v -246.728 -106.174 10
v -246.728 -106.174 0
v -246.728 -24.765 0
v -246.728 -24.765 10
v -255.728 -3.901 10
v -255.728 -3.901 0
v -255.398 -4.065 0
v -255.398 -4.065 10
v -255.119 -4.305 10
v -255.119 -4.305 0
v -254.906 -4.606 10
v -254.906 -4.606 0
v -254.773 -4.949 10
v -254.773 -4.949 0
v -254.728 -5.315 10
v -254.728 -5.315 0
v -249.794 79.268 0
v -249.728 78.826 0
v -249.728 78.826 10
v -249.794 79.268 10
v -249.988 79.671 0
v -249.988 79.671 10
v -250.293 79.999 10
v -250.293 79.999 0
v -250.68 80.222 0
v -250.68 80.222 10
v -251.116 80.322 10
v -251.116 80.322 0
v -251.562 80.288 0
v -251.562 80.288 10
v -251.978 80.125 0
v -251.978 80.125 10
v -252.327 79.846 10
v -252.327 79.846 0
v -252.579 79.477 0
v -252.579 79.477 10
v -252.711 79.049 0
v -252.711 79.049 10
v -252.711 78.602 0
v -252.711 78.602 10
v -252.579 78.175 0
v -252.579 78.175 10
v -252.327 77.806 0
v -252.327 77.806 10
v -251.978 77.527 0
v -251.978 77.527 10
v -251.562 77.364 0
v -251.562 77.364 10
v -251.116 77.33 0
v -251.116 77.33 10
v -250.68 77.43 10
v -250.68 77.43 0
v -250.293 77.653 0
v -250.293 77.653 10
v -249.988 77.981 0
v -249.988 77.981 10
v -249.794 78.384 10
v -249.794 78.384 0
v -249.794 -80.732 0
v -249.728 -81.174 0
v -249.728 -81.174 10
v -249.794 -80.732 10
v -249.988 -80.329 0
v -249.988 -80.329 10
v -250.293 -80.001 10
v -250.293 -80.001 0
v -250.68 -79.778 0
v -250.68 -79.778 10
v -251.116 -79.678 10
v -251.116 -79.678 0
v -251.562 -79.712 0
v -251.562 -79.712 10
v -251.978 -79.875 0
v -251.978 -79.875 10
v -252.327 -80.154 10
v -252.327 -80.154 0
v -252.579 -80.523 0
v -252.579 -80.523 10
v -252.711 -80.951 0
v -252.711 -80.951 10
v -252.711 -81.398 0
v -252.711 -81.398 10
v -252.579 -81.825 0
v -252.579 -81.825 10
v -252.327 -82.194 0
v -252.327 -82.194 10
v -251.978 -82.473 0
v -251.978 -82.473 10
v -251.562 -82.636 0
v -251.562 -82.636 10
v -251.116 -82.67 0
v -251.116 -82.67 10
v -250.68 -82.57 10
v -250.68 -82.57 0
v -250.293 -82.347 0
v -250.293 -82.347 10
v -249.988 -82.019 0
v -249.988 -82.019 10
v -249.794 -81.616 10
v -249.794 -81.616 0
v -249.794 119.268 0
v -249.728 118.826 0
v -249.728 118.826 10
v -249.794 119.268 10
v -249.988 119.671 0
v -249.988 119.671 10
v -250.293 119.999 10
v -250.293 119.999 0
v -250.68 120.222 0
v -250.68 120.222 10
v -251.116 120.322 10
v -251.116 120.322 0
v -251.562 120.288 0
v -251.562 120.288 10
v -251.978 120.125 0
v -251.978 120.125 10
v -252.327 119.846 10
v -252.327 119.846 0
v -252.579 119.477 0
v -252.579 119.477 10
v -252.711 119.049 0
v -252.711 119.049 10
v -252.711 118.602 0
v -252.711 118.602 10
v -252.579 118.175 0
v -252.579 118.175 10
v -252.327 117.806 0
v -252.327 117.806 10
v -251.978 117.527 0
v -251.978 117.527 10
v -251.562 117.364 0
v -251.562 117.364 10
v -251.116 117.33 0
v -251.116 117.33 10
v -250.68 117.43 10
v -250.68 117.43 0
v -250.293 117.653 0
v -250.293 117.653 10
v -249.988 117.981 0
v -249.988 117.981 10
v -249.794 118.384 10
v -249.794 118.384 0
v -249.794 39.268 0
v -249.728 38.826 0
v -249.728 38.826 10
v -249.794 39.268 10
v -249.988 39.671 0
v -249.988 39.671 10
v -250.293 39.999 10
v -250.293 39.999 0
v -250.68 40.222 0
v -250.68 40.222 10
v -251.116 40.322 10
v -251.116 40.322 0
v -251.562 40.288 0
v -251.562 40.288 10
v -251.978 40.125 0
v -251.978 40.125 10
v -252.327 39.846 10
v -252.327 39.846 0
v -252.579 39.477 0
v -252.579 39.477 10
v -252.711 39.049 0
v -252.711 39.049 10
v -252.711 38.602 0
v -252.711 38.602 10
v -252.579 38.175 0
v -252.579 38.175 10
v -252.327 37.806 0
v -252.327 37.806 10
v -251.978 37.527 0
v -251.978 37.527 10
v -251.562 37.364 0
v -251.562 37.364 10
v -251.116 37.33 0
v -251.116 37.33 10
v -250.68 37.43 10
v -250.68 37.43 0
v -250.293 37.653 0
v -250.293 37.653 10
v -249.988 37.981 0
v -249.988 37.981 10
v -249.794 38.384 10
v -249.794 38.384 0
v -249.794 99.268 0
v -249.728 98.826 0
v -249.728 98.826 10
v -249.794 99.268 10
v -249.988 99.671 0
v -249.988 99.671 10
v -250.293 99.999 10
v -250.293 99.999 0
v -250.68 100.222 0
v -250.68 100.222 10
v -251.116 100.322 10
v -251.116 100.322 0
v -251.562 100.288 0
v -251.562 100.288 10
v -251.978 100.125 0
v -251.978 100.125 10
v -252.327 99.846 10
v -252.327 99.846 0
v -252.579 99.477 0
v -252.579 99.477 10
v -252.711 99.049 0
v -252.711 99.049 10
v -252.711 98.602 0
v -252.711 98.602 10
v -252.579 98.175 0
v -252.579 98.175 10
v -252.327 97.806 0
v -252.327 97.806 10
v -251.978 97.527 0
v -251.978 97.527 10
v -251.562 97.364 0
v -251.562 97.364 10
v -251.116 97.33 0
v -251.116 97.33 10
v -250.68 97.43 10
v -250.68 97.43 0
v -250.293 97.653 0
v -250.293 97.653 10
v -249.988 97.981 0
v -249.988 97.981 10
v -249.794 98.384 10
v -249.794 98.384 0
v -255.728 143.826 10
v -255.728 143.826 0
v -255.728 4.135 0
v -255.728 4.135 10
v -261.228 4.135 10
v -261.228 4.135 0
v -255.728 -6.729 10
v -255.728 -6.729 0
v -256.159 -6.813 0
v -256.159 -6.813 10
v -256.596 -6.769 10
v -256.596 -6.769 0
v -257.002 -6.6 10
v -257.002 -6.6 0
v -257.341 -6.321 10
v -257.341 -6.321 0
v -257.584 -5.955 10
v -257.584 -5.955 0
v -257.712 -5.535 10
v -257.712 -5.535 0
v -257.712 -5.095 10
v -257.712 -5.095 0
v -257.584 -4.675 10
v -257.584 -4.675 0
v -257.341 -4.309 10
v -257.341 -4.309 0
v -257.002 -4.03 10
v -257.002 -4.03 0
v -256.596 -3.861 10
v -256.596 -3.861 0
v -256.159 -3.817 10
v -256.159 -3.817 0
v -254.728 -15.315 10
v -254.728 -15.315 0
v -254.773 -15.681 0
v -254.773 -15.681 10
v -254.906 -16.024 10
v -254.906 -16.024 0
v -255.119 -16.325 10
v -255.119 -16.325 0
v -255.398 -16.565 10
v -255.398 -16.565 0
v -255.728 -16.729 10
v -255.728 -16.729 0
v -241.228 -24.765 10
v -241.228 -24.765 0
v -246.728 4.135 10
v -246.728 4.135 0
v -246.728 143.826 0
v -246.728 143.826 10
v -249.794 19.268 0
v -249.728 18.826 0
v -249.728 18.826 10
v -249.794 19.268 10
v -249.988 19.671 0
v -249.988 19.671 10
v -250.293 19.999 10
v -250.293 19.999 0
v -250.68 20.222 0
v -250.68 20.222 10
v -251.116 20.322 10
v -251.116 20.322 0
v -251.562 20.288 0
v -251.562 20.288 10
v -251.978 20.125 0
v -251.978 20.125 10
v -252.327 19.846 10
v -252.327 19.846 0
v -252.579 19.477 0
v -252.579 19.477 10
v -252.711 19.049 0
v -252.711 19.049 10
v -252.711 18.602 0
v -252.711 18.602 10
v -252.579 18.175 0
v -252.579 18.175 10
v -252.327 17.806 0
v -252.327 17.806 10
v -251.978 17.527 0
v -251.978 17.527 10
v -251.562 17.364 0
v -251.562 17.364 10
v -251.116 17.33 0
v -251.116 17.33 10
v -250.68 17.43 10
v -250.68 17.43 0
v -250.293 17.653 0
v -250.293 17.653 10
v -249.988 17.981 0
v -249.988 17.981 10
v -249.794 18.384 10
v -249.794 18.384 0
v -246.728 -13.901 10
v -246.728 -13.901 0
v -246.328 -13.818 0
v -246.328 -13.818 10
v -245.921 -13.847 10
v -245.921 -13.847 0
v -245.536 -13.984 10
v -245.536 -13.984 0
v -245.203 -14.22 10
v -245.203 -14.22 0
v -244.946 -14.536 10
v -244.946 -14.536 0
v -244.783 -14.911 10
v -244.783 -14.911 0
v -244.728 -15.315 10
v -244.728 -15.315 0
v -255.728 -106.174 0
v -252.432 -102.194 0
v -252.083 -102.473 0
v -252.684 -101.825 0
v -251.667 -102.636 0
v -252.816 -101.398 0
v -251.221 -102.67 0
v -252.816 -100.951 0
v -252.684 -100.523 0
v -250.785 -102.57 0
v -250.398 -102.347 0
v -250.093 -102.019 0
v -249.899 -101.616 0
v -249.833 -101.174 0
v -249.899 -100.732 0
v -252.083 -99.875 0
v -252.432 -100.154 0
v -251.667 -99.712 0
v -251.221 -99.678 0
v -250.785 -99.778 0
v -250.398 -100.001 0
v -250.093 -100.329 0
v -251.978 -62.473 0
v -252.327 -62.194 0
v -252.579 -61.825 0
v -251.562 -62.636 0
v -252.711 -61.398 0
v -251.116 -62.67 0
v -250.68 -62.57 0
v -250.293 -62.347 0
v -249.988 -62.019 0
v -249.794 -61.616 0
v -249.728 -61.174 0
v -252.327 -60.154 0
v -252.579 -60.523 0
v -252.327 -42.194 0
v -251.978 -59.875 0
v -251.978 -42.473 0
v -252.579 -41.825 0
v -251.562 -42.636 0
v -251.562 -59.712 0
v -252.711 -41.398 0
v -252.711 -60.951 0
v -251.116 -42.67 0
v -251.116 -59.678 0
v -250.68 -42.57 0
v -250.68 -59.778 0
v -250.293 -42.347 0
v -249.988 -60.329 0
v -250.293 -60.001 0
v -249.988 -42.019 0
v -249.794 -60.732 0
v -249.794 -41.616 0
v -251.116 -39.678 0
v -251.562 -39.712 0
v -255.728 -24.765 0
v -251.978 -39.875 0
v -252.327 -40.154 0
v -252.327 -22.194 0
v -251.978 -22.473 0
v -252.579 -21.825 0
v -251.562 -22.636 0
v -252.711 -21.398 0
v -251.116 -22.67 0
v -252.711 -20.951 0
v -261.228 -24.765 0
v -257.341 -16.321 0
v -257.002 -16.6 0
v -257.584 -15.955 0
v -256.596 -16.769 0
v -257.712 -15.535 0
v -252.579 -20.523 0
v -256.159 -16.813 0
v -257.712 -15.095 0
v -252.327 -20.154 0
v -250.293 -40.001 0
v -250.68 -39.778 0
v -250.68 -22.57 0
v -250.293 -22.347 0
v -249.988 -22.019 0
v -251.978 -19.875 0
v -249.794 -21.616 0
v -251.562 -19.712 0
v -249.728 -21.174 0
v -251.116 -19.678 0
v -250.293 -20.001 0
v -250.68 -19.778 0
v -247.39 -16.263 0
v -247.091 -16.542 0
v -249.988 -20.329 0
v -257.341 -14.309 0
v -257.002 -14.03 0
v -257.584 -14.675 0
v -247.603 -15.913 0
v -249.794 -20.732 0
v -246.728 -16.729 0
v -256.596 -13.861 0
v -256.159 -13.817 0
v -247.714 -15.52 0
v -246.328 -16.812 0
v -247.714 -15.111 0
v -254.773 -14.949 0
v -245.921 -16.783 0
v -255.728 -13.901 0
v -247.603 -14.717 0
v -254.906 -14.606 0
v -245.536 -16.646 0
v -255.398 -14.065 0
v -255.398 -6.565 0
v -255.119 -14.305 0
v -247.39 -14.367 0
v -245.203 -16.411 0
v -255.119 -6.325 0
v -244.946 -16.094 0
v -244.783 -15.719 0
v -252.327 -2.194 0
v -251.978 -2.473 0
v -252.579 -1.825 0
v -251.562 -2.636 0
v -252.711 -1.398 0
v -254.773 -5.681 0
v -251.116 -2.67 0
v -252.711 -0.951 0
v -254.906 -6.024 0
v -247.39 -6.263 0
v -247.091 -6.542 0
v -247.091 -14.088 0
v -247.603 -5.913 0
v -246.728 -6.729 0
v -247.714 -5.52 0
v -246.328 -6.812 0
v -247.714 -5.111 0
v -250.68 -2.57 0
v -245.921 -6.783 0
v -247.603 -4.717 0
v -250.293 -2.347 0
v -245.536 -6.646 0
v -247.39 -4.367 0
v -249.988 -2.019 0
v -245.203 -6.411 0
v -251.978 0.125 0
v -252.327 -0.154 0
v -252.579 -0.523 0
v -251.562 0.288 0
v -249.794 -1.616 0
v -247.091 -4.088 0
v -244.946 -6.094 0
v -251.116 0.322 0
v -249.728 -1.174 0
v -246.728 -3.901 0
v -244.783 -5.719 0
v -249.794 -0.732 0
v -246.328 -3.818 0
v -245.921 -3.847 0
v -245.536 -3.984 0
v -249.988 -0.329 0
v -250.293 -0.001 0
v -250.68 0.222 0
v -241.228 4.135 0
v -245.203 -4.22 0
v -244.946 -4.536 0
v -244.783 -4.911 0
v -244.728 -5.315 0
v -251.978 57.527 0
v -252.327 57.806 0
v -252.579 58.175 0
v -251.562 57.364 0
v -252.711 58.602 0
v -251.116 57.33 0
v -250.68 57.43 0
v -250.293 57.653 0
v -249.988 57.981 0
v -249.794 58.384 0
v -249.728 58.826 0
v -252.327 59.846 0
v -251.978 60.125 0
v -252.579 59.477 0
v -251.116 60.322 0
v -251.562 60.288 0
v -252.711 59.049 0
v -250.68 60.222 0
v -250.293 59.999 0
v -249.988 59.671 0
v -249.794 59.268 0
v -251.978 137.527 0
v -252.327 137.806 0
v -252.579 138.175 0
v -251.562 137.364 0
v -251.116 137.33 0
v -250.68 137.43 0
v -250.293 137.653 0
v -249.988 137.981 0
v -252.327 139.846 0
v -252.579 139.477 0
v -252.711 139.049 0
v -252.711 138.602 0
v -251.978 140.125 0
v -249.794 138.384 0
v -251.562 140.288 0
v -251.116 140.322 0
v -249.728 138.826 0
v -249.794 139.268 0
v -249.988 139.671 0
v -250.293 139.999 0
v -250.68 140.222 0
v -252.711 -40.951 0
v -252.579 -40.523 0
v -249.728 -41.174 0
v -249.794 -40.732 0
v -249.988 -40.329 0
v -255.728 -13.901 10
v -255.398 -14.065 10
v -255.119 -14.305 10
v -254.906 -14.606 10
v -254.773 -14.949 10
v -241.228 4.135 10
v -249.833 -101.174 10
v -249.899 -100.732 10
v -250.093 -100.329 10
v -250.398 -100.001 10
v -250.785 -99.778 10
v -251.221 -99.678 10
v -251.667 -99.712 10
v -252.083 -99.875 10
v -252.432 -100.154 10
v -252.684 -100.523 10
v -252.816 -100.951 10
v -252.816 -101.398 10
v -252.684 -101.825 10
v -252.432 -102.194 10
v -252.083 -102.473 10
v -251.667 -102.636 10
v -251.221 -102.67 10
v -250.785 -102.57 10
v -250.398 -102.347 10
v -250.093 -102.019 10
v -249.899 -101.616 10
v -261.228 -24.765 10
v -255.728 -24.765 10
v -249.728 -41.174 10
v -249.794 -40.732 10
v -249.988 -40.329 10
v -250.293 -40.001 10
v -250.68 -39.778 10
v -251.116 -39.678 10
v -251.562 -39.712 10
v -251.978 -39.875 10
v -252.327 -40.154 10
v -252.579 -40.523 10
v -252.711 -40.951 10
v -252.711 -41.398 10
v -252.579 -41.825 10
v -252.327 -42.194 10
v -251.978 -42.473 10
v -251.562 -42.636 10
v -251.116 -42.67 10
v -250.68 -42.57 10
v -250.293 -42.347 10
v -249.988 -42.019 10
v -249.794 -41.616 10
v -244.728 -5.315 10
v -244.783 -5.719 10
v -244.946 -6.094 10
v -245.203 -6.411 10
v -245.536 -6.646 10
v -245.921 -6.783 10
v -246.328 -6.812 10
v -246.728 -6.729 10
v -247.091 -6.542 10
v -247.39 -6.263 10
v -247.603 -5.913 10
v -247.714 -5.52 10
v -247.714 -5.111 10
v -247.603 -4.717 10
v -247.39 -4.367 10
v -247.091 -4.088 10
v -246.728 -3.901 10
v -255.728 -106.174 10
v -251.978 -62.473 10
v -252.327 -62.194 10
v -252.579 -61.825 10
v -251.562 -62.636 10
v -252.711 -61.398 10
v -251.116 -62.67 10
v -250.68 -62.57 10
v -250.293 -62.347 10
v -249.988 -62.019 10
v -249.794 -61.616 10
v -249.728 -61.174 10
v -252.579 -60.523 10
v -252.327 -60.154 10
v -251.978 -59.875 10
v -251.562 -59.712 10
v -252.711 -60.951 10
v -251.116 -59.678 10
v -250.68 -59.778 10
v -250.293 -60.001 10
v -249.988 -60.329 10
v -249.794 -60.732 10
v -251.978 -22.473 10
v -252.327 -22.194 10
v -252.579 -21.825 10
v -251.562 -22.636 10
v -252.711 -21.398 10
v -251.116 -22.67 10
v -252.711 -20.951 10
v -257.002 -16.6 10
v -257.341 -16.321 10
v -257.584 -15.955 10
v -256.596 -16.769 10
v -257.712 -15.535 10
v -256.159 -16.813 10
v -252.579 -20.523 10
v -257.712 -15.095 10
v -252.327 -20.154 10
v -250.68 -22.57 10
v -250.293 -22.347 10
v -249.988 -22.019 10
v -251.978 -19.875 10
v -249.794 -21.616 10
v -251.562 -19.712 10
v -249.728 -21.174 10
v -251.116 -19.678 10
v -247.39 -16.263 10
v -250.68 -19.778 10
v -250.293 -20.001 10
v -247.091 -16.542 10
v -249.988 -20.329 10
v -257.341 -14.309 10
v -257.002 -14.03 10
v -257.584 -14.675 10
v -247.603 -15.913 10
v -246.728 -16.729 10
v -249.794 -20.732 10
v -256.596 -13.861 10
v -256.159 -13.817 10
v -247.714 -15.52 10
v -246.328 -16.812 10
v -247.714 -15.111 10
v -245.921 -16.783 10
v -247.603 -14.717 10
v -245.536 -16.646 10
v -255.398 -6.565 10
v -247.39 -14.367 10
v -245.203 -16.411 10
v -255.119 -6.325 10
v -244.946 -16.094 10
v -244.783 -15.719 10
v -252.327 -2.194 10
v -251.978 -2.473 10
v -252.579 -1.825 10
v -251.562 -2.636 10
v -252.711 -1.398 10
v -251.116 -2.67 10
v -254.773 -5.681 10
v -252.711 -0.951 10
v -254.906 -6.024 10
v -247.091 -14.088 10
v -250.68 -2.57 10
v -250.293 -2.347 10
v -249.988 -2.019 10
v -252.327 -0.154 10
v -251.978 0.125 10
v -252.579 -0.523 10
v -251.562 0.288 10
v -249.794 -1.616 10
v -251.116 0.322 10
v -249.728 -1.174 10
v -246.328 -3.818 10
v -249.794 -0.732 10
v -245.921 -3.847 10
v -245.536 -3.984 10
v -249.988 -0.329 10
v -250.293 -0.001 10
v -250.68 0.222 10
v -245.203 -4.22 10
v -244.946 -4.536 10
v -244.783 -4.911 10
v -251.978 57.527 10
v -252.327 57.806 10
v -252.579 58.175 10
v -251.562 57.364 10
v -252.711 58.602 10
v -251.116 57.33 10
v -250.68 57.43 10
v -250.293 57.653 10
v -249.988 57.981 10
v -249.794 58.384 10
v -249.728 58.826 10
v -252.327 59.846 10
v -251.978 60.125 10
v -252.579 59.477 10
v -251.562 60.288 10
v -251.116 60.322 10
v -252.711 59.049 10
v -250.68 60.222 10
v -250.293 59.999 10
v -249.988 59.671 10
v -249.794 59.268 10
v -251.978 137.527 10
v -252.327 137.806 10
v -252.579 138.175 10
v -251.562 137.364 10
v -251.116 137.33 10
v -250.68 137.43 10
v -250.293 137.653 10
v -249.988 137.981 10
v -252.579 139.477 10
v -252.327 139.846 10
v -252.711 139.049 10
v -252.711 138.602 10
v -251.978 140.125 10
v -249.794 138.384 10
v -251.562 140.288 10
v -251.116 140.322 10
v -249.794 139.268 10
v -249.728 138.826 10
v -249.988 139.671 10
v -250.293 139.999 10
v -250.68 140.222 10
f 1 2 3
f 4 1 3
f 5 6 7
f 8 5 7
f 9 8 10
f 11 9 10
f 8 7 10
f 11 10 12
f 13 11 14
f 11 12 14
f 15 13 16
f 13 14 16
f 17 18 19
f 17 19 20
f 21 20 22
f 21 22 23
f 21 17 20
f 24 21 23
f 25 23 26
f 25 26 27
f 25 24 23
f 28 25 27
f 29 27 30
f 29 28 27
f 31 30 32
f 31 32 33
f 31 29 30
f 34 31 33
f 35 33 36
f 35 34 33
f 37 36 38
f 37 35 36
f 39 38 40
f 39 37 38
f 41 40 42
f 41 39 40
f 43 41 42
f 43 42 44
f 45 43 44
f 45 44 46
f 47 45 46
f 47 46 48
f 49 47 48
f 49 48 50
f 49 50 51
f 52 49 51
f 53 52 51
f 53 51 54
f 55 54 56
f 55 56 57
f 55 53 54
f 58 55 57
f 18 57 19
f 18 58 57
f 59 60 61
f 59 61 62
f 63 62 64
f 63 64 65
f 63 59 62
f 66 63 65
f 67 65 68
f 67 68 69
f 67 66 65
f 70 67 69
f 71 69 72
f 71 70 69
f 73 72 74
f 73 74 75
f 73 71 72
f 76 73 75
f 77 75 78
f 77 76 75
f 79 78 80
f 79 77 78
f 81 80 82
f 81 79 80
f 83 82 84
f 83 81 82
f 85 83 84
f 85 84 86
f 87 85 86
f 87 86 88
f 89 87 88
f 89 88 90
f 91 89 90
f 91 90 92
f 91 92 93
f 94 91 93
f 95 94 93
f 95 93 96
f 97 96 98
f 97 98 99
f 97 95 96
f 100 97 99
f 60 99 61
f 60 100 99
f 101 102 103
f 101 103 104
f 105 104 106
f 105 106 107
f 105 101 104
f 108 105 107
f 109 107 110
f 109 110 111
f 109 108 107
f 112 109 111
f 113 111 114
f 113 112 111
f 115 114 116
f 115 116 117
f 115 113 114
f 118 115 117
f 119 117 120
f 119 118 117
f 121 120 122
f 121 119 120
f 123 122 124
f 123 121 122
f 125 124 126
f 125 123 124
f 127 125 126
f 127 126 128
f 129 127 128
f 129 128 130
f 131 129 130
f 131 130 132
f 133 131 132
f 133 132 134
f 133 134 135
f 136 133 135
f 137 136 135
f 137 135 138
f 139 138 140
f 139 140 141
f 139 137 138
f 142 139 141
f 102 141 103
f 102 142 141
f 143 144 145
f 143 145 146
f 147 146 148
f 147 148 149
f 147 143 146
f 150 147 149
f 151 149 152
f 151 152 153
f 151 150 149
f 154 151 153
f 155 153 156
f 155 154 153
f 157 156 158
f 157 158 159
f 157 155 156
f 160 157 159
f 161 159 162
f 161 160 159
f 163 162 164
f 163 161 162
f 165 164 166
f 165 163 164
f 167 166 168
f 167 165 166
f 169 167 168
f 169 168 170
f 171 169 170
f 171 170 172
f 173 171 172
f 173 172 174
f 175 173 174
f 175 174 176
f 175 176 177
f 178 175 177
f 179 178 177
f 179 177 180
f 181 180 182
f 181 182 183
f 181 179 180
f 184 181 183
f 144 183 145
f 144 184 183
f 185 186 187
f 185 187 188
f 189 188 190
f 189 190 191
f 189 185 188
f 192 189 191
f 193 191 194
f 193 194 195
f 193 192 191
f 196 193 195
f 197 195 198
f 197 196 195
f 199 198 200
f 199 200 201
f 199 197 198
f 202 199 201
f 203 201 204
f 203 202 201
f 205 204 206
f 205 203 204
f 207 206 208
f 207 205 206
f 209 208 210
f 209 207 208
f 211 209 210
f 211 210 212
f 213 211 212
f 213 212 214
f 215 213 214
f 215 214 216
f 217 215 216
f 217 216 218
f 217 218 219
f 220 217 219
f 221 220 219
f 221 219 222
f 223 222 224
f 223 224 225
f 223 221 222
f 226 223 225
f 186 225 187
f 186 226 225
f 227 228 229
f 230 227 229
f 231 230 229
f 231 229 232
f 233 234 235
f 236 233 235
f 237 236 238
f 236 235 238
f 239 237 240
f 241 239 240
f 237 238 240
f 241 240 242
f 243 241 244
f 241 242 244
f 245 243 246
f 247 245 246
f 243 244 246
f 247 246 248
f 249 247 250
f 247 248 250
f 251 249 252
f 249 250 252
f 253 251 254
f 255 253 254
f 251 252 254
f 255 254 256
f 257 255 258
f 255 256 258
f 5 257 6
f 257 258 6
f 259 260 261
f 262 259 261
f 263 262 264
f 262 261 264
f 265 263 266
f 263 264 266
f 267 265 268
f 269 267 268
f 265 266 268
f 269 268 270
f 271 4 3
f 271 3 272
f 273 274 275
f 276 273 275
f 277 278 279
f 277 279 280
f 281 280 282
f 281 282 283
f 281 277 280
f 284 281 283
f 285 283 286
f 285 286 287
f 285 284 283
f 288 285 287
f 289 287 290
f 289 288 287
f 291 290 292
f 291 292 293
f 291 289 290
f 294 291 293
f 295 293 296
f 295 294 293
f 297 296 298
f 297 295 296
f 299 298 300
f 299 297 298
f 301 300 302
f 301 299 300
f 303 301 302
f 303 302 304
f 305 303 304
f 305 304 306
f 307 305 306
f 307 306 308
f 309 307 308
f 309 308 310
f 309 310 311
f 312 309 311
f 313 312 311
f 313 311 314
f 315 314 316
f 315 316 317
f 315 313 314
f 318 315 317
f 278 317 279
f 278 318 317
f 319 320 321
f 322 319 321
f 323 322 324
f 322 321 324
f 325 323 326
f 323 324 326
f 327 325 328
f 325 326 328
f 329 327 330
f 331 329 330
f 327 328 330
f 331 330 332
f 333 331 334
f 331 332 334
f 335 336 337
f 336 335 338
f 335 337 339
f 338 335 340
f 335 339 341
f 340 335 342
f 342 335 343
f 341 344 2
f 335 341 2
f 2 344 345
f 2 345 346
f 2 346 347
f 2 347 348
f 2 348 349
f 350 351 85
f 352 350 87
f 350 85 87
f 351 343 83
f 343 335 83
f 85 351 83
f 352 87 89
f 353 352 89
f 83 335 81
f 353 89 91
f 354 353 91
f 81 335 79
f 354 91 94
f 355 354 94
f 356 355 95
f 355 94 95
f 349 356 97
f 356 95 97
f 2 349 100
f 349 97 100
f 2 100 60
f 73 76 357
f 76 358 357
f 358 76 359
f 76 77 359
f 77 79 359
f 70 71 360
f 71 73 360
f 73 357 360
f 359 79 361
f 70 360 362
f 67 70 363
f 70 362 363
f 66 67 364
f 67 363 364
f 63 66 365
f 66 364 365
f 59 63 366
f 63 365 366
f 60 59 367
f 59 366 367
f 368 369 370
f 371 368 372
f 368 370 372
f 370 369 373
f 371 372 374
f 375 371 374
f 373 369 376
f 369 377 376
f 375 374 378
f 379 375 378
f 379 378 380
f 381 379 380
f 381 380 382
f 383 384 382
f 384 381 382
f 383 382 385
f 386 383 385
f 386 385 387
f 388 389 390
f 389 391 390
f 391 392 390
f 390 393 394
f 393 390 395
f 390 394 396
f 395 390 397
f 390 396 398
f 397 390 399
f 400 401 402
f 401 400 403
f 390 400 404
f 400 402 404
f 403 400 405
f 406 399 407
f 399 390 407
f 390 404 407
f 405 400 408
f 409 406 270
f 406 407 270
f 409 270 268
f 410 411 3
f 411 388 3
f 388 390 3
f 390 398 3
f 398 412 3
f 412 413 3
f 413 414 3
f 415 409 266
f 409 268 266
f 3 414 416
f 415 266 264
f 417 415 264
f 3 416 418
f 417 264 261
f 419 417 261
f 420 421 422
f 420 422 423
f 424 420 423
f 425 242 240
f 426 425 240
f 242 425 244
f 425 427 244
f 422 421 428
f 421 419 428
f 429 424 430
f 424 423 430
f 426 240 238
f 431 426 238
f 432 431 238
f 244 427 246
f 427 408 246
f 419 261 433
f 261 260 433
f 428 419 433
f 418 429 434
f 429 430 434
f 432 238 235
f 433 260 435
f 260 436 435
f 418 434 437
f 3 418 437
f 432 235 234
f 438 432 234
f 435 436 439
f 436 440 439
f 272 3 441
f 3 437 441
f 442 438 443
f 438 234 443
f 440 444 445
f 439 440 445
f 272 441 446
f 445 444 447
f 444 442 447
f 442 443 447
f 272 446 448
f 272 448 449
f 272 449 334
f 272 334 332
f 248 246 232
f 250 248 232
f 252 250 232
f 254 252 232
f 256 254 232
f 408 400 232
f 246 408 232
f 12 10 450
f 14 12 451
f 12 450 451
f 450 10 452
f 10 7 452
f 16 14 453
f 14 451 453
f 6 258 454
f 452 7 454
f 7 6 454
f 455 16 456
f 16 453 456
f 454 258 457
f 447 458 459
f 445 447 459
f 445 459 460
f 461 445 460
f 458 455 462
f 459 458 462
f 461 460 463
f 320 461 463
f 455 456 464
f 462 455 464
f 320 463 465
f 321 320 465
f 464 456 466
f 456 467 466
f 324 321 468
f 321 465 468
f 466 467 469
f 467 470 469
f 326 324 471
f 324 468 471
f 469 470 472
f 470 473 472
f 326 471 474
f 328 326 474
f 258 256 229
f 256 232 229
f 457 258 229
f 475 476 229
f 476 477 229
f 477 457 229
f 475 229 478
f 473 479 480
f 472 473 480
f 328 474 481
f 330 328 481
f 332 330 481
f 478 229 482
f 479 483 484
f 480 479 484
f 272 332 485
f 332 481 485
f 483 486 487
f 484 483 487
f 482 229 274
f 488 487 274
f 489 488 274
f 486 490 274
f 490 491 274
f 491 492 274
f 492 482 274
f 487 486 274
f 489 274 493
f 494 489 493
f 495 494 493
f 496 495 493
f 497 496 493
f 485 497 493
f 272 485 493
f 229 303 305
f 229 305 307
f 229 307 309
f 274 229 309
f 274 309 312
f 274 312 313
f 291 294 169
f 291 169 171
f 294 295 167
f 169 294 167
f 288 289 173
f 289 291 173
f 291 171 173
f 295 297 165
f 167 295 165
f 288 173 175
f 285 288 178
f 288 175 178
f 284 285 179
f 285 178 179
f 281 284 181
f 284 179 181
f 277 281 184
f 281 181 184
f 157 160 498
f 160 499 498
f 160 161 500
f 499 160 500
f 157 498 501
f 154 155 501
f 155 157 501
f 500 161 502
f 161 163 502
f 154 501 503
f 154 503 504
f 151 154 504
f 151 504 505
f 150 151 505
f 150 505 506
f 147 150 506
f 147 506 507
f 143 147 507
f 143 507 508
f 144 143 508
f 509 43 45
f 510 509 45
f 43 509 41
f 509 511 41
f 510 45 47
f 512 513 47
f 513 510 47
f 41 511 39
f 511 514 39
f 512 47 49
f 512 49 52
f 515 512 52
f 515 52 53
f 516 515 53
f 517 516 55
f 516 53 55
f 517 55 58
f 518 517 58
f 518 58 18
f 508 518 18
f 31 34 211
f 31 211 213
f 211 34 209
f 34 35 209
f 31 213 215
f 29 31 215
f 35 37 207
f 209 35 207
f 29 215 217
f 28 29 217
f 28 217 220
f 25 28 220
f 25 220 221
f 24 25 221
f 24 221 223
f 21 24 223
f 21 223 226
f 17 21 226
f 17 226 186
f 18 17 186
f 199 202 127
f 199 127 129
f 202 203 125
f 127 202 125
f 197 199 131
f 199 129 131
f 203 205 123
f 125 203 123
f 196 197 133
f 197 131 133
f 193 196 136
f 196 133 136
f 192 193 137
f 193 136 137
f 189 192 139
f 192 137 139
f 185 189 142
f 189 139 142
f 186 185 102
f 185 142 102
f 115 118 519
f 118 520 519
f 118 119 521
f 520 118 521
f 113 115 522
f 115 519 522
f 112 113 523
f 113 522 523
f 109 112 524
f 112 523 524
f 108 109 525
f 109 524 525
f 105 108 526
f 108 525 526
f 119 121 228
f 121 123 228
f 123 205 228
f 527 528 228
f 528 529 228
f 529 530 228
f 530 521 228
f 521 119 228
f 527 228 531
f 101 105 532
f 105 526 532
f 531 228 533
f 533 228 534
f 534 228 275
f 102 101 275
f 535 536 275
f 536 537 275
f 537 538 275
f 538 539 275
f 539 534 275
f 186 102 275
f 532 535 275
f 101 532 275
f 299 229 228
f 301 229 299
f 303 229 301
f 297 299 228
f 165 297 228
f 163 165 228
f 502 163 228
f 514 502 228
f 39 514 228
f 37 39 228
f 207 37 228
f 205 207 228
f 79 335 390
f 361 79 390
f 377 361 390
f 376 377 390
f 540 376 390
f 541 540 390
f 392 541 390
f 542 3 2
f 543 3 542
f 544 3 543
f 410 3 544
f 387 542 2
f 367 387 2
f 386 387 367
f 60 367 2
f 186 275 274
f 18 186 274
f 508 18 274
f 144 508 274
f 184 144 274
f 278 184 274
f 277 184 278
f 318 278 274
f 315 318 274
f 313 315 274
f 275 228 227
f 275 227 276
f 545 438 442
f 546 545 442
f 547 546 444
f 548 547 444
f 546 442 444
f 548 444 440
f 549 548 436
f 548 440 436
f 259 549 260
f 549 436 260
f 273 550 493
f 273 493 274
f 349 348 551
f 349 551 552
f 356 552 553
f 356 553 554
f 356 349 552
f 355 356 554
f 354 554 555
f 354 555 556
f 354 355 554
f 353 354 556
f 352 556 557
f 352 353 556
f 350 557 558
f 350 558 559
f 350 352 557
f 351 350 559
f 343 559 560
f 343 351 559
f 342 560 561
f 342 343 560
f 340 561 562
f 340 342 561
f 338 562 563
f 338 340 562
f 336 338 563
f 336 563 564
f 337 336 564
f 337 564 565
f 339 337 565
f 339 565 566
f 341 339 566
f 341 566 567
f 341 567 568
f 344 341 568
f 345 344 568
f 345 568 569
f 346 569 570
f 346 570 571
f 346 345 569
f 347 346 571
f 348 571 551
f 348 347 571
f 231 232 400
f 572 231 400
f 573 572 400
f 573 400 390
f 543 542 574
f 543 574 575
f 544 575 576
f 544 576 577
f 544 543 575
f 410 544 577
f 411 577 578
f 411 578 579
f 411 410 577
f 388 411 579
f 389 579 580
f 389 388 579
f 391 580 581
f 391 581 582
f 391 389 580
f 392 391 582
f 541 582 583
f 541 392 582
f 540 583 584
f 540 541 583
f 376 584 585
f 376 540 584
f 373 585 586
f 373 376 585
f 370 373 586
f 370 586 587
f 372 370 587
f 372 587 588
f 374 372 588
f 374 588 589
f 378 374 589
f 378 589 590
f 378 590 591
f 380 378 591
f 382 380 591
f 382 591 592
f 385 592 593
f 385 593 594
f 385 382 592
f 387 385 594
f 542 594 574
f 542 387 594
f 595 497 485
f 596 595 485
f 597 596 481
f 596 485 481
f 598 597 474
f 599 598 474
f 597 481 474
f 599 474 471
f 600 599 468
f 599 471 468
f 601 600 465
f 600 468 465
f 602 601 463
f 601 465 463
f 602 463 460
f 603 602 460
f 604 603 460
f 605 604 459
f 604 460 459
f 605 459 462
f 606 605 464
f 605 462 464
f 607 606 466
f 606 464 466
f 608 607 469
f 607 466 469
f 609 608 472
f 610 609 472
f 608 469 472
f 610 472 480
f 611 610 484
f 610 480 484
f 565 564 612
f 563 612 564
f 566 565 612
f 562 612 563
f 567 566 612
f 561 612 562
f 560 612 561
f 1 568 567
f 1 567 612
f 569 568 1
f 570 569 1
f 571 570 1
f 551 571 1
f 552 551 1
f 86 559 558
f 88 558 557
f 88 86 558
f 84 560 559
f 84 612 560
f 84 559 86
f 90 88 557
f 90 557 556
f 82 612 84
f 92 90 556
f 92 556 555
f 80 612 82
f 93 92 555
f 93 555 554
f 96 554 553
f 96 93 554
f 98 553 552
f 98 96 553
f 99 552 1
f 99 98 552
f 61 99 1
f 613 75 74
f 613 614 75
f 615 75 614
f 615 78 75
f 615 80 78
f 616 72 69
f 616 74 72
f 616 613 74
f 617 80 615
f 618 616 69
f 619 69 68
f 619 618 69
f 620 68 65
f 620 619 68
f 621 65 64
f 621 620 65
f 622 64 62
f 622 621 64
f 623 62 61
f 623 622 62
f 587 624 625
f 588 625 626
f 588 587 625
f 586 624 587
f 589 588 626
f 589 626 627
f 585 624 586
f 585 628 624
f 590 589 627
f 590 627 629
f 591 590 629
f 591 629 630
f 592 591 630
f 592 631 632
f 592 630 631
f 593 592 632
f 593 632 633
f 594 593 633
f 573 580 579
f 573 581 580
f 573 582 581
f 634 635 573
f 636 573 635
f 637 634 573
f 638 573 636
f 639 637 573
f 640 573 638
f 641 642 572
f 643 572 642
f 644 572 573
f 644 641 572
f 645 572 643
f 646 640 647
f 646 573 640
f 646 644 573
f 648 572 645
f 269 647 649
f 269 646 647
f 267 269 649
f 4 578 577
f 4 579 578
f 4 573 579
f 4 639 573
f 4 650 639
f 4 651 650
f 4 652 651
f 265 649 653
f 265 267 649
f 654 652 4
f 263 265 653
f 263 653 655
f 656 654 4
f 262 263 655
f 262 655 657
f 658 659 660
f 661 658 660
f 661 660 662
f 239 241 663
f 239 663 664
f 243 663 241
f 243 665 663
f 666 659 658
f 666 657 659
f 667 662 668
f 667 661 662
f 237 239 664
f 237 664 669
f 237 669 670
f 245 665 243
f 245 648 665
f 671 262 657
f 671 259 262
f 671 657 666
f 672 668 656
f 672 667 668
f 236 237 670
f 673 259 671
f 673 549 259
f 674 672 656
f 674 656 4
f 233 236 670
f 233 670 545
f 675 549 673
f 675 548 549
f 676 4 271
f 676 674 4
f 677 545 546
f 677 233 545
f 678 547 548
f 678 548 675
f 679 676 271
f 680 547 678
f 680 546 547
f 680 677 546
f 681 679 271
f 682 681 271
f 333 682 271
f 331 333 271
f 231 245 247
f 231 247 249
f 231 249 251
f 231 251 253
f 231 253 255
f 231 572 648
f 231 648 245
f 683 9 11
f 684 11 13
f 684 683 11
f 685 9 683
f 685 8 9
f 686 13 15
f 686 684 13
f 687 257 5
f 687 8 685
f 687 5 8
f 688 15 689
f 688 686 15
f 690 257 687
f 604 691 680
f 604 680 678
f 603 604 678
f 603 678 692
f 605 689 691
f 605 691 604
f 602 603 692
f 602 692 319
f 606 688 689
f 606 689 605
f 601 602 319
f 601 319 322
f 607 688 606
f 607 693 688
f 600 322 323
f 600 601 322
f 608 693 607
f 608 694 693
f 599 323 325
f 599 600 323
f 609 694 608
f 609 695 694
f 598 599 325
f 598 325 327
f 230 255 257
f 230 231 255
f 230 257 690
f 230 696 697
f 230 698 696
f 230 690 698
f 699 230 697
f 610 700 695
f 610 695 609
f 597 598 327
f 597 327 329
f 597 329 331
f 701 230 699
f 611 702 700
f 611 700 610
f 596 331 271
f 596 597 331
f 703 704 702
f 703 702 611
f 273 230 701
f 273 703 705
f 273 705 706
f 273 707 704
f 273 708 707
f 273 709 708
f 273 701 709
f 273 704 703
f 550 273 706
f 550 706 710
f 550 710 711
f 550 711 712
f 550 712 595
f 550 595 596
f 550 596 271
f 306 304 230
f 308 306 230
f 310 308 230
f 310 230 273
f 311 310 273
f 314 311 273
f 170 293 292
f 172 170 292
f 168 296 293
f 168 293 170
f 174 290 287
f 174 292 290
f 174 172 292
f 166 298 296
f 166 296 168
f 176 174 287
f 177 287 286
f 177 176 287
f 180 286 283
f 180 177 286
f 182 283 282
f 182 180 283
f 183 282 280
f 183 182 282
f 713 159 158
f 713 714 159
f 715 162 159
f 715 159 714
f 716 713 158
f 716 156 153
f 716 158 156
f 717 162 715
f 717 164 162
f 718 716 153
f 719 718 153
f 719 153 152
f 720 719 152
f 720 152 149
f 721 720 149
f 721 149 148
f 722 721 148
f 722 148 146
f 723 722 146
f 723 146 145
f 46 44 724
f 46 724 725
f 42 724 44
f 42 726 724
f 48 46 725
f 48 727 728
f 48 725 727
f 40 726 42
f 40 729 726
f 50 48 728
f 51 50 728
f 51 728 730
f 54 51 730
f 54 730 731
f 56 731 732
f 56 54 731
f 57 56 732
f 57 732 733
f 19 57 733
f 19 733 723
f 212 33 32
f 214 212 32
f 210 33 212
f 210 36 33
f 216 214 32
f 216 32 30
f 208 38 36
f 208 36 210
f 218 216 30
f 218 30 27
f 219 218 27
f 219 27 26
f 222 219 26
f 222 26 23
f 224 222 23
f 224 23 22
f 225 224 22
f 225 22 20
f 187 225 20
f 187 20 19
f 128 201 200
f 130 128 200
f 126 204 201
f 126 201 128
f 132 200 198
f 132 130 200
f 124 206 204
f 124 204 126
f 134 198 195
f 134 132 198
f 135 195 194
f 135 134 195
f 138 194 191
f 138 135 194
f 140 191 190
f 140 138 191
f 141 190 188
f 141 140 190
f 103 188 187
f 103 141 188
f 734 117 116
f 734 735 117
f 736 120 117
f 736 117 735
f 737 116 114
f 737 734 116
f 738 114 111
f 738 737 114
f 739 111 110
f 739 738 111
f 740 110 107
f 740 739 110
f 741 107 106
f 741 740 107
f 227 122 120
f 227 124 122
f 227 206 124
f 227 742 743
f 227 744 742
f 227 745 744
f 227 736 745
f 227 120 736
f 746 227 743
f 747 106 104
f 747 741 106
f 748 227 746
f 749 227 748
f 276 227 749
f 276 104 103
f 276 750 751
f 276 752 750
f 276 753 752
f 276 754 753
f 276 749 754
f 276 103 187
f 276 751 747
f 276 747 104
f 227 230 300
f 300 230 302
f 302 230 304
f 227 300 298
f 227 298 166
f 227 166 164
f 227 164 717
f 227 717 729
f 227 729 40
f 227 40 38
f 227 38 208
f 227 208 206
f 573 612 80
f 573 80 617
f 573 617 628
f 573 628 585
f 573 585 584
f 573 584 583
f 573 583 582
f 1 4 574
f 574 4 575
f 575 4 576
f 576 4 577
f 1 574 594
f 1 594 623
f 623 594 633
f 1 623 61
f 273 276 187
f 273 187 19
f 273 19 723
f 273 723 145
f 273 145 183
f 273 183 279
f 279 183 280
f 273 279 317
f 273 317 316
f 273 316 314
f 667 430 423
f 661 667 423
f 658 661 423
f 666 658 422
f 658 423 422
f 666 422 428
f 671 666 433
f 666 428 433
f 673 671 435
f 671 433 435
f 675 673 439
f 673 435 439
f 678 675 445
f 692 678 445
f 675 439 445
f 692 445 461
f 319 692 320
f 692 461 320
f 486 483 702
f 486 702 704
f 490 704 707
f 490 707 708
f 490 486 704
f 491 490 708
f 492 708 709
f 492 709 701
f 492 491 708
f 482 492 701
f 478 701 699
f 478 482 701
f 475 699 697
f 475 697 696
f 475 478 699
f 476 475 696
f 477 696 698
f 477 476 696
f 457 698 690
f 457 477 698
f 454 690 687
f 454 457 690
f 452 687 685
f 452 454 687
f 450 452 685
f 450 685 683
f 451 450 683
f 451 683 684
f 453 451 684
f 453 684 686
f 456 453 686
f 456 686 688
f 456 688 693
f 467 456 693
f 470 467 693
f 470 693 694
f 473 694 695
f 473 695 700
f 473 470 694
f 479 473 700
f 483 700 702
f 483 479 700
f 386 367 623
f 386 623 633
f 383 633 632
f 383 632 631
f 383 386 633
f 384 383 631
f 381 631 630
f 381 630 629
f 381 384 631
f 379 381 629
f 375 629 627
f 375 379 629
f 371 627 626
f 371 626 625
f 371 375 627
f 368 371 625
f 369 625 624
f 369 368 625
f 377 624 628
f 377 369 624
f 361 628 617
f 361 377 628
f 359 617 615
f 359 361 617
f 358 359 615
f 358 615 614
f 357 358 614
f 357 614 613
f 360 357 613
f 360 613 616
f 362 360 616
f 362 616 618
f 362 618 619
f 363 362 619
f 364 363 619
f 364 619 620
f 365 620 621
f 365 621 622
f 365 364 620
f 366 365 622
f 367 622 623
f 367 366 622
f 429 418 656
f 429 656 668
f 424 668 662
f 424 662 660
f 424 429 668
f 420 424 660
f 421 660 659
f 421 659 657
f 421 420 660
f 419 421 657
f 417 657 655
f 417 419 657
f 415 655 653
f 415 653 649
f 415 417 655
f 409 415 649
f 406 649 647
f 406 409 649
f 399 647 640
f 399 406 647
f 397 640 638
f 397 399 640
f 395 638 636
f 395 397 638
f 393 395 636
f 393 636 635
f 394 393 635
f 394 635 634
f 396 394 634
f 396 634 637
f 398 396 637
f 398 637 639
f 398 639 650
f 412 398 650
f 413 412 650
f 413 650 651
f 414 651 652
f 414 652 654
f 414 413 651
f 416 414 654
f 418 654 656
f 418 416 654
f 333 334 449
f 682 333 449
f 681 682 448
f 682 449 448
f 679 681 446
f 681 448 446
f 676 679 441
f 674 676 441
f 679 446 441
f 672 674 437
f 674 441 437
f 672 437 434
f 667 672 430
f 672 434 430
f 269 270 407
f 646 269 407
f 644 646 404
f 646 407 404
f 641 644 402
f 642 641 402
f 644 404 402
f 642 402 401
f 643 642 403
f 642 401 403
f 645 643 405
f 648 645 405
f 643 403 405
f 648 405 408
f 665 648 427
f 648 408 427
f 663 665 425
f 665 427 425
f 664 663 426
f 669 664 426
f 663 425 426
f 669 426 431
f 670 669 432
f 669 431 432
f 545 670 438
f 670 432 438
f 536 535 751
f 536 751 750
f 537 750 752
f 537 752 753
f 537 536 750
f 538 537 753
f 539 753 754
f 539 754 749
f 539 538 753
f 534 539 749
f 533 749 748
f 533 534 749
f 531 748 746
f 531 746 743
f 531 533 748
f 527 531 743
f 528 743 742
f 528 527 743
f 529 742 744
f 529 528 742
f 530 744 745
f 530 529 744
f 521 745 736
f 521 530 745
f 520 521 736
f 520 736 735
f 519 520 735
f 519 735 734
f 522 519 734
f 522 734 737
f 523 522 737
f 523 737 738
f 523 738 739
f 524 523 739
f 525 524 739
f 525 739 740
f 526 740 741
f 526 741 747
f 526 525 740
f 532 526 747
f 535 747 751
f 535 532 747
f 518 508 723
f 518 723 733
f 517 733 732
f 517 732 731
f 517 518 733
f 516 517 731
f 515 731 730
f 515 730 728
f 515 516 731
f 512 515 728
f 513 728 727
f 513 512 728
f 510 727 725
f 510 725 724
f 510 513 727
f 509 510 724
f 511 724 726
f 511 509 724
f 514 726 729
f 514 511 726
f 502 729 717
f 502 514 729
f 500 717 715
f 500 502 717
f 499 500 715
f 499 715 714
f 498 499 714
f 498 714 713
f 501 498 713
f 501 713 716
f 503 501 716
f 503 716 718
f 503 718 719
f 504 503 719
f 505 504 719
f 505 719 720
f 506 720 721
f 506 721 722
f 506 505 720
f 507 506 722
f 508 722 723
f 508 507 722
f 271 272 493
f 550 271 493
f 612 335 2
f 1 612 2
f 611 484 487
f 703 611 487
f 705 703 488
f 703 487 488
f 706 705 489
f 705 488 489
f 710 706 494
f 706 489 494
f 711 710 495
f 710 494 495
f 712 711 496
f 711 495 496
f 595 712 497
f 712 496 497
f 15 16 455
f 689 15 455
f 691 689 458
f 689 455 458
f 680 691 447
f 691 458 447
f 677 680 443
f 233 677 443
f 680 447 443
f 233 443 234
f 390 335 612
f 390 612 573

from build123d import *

# Parameters (mm, degrees)
F0_W     = 9
F0_H     = 139.6909442604
F0_R     = 1.5
F0_H_2   = 81.4090557396
F1_DEPTH = 10


with BuildPart() as f1:
    # F0 (on Top) → F1 (new body)
    with BuildSketch(Plane.XY):
        with Locations((-251.2277567387, 73.9804314047)):
            Rectangle(F0_W, F0_H)
        with Locations((-251.2277567387, 18.8259035349)):
            Circle(F0_R, mode=Mode.SUBTRACT)
        with Locations((-251.2277567387, 38.8259035349)):
            Circle(F0_R, mode=Mode.SUBTRACT)
        with Locations((-251.2277567387, 58.8259035349)):
            Circle(F0_R, mode=Mode.SUBTRACT)
        with Locations((-251.2277567387, 78.8259035349)):
            Circle(F0_R, mode=Mode.SUBTRACT)
        with Locations((-251.2277567387, 98.8259035349)):
            Circle(F0_R, mode=Mode.SUBTRACT)
        with Locations((-251.2277567387, 118.8259035349)):
            Circle(F0_R, mode=Mode.SUBTRACT)
        with Locations((-251.2277567387, 138.8259035349)):
            Circle(F0_R, mode=Mode.SUBTRACT)
        with BuildLine():
            Line((-246.7277567387, 4.1349592745), (-255.7277567387, 4.1349592745))
            Line((-255.7277567387, 4.1349592745), (-255.7277567387, -3.9008271631))
            ThreePointArc((-255.7277567387, -3.9008271631), (-255.0030118673, -4.4490153217), (-254.7277567387, -5.3150407255))
            ThreePointArc((-254.7277567387, -5.3150407255), (-255.0030118673, -6.1810661293), (-255.7277567387, -6.7292542878))
            Line((-255.7277567387, -6.7292542878), (-255.7277567387, -13.9008271631))
            ThreePointArc((-255.7277567387, -13.9008271631), (-255.0030118673, -14.4490153217), (-254.7277567387, -15.3150407255))
            ThreePointArc((-254.7277567387, -15.3150407255), (-255.0030118673, -16.1810661293), (-255.7277567387, -16.7292542878))
            Line((-255.7277567387, -16.7292542878), (-255.7277567387, -24.7650407255))
            Line((-255.7277567387, -24.7650407255), (-246.7277567387, -24.7650407255))
            Line((-246.7277567387, -24.7650407255), (-246.7277567387, -16.7292542878))
            ThreePointArc((-246.7277567387, -16.7292542878), (-247.7277567387, -15.3150407255), (-246.7277567387, -13.9008271631))
            Line((-246.7277567387, -13.9008271631), (-246.7277567387, -6.7292542878))
            ThreePointArc((-246.7277567387, -6.7292542878), (-247.7277567387, -5.3150407255), (-246.7277567387, -3.9008271631))
            Line((-246.7277567387, -3.9008271631), (-246.7277567387, 4.1349592745))
        make_face()
        with Locations((-251.2277567387, -21.1740964651)):
            Circle(F0_R, mode=Mode.SUBTRACT)
        with Locations((-251.2277567387, -1.1740964651)):
            Circle(F0_R, mode=Mode.SUBTRACT)
        with BuildLine():
            Line((-255.7277567387, -3.9008271631), (-255.7277567387, 4.1349592745))
            Line((-255.7277567387, 4.1349592745), (-261.2277567387, 4.1349592745))
            Line((-261.2277567387, 4.1349592745), (-261.2277567387, -24.7650407255))
            Line((-261.2277567387, -24.7650407255), (-255.7277567387, -24.7650407255))
            Line((-255.7277567387, -24.7650407255), (-255.7277567387, -16.7292542878))
            ThreePointArc((-255.7277567387, -16.7292542878), (-257.7277567387, -15.3150407255), (-255.7277567387, -13.9008271631))
            Line((-255.7277567387, -13.9008271631), (-255.7277567387, -6.7292542878))
            ThreePointArc((-255.7277567387, -6.7292542878), (-257.7277567387, -5.3150407255), (-255.7277567387, -3.9008271631))
        make_face()
        with BuildLine():
            Line((-241.2277567387, 4.1349592745), (-246.7277567387, 4.1349592745))
            Line((-246.7277567387, 4.1349592745), (-246.7277567387, -3.9008271631))
            ThreePointArc((-246.7277567387, -3.9008271631), (-245.3617313349, -4.0902958541), (-244.7277567387, -5.3150407255))
            ThreePointArc((-244.7277567387, -5.3150407255), (-245.3617313349, -6.5397855969), (-246.7277567387, -6.7292542878))
            Line((-246.7277567387, -6.7292542878), (-246.7277567387, -13.9008271631))
            ThreePointArc((-246.7277567387, -13.9008271631), (-245.3617313349, -14.0902958541), (-244.7277567387, -15.3150407255))
            ThreePointArc((-244.7277567387, -15.3150407255), (-245.3617313349, -16.5397855969), (-246.7277567387, -16.7292542878))
            Line((-246.7277567387, -16.7292542878), (-246.7277567387, -24.7650407255))
            Line((-246.7277567387, -24.7650407255), (-241.2277567387, -24.7650407255))
            Line((-241.2277567387, -24.7650407255), (-241.2277567387, 4.1349592745))
        make_face()
        with Locations((-251.2277567387, -65.4695685953)):
            Rectangle(F0_W, F0_H_2)
        with Locations((-251.3328434825, -101.1740964651)):
            Circle(F0_R, mode=Mode.SUBTRACT)
        with Locations((-251.2277567387, -81.1740964651)):
            Circle(F0_R, mode=Mode.SUBTRACT)
        with Locations((-251.2277567387, -61.1740964651)):
            Circle(F0_R, mode=Mode.SUBTRACT)
        with Locations((-251.2277567387, -41.1740964651)):
            Circle(F0_R, mode=Mode.SUBTRACT)
    extrude(amount=F1_DEPTH)


solid = f1.part
